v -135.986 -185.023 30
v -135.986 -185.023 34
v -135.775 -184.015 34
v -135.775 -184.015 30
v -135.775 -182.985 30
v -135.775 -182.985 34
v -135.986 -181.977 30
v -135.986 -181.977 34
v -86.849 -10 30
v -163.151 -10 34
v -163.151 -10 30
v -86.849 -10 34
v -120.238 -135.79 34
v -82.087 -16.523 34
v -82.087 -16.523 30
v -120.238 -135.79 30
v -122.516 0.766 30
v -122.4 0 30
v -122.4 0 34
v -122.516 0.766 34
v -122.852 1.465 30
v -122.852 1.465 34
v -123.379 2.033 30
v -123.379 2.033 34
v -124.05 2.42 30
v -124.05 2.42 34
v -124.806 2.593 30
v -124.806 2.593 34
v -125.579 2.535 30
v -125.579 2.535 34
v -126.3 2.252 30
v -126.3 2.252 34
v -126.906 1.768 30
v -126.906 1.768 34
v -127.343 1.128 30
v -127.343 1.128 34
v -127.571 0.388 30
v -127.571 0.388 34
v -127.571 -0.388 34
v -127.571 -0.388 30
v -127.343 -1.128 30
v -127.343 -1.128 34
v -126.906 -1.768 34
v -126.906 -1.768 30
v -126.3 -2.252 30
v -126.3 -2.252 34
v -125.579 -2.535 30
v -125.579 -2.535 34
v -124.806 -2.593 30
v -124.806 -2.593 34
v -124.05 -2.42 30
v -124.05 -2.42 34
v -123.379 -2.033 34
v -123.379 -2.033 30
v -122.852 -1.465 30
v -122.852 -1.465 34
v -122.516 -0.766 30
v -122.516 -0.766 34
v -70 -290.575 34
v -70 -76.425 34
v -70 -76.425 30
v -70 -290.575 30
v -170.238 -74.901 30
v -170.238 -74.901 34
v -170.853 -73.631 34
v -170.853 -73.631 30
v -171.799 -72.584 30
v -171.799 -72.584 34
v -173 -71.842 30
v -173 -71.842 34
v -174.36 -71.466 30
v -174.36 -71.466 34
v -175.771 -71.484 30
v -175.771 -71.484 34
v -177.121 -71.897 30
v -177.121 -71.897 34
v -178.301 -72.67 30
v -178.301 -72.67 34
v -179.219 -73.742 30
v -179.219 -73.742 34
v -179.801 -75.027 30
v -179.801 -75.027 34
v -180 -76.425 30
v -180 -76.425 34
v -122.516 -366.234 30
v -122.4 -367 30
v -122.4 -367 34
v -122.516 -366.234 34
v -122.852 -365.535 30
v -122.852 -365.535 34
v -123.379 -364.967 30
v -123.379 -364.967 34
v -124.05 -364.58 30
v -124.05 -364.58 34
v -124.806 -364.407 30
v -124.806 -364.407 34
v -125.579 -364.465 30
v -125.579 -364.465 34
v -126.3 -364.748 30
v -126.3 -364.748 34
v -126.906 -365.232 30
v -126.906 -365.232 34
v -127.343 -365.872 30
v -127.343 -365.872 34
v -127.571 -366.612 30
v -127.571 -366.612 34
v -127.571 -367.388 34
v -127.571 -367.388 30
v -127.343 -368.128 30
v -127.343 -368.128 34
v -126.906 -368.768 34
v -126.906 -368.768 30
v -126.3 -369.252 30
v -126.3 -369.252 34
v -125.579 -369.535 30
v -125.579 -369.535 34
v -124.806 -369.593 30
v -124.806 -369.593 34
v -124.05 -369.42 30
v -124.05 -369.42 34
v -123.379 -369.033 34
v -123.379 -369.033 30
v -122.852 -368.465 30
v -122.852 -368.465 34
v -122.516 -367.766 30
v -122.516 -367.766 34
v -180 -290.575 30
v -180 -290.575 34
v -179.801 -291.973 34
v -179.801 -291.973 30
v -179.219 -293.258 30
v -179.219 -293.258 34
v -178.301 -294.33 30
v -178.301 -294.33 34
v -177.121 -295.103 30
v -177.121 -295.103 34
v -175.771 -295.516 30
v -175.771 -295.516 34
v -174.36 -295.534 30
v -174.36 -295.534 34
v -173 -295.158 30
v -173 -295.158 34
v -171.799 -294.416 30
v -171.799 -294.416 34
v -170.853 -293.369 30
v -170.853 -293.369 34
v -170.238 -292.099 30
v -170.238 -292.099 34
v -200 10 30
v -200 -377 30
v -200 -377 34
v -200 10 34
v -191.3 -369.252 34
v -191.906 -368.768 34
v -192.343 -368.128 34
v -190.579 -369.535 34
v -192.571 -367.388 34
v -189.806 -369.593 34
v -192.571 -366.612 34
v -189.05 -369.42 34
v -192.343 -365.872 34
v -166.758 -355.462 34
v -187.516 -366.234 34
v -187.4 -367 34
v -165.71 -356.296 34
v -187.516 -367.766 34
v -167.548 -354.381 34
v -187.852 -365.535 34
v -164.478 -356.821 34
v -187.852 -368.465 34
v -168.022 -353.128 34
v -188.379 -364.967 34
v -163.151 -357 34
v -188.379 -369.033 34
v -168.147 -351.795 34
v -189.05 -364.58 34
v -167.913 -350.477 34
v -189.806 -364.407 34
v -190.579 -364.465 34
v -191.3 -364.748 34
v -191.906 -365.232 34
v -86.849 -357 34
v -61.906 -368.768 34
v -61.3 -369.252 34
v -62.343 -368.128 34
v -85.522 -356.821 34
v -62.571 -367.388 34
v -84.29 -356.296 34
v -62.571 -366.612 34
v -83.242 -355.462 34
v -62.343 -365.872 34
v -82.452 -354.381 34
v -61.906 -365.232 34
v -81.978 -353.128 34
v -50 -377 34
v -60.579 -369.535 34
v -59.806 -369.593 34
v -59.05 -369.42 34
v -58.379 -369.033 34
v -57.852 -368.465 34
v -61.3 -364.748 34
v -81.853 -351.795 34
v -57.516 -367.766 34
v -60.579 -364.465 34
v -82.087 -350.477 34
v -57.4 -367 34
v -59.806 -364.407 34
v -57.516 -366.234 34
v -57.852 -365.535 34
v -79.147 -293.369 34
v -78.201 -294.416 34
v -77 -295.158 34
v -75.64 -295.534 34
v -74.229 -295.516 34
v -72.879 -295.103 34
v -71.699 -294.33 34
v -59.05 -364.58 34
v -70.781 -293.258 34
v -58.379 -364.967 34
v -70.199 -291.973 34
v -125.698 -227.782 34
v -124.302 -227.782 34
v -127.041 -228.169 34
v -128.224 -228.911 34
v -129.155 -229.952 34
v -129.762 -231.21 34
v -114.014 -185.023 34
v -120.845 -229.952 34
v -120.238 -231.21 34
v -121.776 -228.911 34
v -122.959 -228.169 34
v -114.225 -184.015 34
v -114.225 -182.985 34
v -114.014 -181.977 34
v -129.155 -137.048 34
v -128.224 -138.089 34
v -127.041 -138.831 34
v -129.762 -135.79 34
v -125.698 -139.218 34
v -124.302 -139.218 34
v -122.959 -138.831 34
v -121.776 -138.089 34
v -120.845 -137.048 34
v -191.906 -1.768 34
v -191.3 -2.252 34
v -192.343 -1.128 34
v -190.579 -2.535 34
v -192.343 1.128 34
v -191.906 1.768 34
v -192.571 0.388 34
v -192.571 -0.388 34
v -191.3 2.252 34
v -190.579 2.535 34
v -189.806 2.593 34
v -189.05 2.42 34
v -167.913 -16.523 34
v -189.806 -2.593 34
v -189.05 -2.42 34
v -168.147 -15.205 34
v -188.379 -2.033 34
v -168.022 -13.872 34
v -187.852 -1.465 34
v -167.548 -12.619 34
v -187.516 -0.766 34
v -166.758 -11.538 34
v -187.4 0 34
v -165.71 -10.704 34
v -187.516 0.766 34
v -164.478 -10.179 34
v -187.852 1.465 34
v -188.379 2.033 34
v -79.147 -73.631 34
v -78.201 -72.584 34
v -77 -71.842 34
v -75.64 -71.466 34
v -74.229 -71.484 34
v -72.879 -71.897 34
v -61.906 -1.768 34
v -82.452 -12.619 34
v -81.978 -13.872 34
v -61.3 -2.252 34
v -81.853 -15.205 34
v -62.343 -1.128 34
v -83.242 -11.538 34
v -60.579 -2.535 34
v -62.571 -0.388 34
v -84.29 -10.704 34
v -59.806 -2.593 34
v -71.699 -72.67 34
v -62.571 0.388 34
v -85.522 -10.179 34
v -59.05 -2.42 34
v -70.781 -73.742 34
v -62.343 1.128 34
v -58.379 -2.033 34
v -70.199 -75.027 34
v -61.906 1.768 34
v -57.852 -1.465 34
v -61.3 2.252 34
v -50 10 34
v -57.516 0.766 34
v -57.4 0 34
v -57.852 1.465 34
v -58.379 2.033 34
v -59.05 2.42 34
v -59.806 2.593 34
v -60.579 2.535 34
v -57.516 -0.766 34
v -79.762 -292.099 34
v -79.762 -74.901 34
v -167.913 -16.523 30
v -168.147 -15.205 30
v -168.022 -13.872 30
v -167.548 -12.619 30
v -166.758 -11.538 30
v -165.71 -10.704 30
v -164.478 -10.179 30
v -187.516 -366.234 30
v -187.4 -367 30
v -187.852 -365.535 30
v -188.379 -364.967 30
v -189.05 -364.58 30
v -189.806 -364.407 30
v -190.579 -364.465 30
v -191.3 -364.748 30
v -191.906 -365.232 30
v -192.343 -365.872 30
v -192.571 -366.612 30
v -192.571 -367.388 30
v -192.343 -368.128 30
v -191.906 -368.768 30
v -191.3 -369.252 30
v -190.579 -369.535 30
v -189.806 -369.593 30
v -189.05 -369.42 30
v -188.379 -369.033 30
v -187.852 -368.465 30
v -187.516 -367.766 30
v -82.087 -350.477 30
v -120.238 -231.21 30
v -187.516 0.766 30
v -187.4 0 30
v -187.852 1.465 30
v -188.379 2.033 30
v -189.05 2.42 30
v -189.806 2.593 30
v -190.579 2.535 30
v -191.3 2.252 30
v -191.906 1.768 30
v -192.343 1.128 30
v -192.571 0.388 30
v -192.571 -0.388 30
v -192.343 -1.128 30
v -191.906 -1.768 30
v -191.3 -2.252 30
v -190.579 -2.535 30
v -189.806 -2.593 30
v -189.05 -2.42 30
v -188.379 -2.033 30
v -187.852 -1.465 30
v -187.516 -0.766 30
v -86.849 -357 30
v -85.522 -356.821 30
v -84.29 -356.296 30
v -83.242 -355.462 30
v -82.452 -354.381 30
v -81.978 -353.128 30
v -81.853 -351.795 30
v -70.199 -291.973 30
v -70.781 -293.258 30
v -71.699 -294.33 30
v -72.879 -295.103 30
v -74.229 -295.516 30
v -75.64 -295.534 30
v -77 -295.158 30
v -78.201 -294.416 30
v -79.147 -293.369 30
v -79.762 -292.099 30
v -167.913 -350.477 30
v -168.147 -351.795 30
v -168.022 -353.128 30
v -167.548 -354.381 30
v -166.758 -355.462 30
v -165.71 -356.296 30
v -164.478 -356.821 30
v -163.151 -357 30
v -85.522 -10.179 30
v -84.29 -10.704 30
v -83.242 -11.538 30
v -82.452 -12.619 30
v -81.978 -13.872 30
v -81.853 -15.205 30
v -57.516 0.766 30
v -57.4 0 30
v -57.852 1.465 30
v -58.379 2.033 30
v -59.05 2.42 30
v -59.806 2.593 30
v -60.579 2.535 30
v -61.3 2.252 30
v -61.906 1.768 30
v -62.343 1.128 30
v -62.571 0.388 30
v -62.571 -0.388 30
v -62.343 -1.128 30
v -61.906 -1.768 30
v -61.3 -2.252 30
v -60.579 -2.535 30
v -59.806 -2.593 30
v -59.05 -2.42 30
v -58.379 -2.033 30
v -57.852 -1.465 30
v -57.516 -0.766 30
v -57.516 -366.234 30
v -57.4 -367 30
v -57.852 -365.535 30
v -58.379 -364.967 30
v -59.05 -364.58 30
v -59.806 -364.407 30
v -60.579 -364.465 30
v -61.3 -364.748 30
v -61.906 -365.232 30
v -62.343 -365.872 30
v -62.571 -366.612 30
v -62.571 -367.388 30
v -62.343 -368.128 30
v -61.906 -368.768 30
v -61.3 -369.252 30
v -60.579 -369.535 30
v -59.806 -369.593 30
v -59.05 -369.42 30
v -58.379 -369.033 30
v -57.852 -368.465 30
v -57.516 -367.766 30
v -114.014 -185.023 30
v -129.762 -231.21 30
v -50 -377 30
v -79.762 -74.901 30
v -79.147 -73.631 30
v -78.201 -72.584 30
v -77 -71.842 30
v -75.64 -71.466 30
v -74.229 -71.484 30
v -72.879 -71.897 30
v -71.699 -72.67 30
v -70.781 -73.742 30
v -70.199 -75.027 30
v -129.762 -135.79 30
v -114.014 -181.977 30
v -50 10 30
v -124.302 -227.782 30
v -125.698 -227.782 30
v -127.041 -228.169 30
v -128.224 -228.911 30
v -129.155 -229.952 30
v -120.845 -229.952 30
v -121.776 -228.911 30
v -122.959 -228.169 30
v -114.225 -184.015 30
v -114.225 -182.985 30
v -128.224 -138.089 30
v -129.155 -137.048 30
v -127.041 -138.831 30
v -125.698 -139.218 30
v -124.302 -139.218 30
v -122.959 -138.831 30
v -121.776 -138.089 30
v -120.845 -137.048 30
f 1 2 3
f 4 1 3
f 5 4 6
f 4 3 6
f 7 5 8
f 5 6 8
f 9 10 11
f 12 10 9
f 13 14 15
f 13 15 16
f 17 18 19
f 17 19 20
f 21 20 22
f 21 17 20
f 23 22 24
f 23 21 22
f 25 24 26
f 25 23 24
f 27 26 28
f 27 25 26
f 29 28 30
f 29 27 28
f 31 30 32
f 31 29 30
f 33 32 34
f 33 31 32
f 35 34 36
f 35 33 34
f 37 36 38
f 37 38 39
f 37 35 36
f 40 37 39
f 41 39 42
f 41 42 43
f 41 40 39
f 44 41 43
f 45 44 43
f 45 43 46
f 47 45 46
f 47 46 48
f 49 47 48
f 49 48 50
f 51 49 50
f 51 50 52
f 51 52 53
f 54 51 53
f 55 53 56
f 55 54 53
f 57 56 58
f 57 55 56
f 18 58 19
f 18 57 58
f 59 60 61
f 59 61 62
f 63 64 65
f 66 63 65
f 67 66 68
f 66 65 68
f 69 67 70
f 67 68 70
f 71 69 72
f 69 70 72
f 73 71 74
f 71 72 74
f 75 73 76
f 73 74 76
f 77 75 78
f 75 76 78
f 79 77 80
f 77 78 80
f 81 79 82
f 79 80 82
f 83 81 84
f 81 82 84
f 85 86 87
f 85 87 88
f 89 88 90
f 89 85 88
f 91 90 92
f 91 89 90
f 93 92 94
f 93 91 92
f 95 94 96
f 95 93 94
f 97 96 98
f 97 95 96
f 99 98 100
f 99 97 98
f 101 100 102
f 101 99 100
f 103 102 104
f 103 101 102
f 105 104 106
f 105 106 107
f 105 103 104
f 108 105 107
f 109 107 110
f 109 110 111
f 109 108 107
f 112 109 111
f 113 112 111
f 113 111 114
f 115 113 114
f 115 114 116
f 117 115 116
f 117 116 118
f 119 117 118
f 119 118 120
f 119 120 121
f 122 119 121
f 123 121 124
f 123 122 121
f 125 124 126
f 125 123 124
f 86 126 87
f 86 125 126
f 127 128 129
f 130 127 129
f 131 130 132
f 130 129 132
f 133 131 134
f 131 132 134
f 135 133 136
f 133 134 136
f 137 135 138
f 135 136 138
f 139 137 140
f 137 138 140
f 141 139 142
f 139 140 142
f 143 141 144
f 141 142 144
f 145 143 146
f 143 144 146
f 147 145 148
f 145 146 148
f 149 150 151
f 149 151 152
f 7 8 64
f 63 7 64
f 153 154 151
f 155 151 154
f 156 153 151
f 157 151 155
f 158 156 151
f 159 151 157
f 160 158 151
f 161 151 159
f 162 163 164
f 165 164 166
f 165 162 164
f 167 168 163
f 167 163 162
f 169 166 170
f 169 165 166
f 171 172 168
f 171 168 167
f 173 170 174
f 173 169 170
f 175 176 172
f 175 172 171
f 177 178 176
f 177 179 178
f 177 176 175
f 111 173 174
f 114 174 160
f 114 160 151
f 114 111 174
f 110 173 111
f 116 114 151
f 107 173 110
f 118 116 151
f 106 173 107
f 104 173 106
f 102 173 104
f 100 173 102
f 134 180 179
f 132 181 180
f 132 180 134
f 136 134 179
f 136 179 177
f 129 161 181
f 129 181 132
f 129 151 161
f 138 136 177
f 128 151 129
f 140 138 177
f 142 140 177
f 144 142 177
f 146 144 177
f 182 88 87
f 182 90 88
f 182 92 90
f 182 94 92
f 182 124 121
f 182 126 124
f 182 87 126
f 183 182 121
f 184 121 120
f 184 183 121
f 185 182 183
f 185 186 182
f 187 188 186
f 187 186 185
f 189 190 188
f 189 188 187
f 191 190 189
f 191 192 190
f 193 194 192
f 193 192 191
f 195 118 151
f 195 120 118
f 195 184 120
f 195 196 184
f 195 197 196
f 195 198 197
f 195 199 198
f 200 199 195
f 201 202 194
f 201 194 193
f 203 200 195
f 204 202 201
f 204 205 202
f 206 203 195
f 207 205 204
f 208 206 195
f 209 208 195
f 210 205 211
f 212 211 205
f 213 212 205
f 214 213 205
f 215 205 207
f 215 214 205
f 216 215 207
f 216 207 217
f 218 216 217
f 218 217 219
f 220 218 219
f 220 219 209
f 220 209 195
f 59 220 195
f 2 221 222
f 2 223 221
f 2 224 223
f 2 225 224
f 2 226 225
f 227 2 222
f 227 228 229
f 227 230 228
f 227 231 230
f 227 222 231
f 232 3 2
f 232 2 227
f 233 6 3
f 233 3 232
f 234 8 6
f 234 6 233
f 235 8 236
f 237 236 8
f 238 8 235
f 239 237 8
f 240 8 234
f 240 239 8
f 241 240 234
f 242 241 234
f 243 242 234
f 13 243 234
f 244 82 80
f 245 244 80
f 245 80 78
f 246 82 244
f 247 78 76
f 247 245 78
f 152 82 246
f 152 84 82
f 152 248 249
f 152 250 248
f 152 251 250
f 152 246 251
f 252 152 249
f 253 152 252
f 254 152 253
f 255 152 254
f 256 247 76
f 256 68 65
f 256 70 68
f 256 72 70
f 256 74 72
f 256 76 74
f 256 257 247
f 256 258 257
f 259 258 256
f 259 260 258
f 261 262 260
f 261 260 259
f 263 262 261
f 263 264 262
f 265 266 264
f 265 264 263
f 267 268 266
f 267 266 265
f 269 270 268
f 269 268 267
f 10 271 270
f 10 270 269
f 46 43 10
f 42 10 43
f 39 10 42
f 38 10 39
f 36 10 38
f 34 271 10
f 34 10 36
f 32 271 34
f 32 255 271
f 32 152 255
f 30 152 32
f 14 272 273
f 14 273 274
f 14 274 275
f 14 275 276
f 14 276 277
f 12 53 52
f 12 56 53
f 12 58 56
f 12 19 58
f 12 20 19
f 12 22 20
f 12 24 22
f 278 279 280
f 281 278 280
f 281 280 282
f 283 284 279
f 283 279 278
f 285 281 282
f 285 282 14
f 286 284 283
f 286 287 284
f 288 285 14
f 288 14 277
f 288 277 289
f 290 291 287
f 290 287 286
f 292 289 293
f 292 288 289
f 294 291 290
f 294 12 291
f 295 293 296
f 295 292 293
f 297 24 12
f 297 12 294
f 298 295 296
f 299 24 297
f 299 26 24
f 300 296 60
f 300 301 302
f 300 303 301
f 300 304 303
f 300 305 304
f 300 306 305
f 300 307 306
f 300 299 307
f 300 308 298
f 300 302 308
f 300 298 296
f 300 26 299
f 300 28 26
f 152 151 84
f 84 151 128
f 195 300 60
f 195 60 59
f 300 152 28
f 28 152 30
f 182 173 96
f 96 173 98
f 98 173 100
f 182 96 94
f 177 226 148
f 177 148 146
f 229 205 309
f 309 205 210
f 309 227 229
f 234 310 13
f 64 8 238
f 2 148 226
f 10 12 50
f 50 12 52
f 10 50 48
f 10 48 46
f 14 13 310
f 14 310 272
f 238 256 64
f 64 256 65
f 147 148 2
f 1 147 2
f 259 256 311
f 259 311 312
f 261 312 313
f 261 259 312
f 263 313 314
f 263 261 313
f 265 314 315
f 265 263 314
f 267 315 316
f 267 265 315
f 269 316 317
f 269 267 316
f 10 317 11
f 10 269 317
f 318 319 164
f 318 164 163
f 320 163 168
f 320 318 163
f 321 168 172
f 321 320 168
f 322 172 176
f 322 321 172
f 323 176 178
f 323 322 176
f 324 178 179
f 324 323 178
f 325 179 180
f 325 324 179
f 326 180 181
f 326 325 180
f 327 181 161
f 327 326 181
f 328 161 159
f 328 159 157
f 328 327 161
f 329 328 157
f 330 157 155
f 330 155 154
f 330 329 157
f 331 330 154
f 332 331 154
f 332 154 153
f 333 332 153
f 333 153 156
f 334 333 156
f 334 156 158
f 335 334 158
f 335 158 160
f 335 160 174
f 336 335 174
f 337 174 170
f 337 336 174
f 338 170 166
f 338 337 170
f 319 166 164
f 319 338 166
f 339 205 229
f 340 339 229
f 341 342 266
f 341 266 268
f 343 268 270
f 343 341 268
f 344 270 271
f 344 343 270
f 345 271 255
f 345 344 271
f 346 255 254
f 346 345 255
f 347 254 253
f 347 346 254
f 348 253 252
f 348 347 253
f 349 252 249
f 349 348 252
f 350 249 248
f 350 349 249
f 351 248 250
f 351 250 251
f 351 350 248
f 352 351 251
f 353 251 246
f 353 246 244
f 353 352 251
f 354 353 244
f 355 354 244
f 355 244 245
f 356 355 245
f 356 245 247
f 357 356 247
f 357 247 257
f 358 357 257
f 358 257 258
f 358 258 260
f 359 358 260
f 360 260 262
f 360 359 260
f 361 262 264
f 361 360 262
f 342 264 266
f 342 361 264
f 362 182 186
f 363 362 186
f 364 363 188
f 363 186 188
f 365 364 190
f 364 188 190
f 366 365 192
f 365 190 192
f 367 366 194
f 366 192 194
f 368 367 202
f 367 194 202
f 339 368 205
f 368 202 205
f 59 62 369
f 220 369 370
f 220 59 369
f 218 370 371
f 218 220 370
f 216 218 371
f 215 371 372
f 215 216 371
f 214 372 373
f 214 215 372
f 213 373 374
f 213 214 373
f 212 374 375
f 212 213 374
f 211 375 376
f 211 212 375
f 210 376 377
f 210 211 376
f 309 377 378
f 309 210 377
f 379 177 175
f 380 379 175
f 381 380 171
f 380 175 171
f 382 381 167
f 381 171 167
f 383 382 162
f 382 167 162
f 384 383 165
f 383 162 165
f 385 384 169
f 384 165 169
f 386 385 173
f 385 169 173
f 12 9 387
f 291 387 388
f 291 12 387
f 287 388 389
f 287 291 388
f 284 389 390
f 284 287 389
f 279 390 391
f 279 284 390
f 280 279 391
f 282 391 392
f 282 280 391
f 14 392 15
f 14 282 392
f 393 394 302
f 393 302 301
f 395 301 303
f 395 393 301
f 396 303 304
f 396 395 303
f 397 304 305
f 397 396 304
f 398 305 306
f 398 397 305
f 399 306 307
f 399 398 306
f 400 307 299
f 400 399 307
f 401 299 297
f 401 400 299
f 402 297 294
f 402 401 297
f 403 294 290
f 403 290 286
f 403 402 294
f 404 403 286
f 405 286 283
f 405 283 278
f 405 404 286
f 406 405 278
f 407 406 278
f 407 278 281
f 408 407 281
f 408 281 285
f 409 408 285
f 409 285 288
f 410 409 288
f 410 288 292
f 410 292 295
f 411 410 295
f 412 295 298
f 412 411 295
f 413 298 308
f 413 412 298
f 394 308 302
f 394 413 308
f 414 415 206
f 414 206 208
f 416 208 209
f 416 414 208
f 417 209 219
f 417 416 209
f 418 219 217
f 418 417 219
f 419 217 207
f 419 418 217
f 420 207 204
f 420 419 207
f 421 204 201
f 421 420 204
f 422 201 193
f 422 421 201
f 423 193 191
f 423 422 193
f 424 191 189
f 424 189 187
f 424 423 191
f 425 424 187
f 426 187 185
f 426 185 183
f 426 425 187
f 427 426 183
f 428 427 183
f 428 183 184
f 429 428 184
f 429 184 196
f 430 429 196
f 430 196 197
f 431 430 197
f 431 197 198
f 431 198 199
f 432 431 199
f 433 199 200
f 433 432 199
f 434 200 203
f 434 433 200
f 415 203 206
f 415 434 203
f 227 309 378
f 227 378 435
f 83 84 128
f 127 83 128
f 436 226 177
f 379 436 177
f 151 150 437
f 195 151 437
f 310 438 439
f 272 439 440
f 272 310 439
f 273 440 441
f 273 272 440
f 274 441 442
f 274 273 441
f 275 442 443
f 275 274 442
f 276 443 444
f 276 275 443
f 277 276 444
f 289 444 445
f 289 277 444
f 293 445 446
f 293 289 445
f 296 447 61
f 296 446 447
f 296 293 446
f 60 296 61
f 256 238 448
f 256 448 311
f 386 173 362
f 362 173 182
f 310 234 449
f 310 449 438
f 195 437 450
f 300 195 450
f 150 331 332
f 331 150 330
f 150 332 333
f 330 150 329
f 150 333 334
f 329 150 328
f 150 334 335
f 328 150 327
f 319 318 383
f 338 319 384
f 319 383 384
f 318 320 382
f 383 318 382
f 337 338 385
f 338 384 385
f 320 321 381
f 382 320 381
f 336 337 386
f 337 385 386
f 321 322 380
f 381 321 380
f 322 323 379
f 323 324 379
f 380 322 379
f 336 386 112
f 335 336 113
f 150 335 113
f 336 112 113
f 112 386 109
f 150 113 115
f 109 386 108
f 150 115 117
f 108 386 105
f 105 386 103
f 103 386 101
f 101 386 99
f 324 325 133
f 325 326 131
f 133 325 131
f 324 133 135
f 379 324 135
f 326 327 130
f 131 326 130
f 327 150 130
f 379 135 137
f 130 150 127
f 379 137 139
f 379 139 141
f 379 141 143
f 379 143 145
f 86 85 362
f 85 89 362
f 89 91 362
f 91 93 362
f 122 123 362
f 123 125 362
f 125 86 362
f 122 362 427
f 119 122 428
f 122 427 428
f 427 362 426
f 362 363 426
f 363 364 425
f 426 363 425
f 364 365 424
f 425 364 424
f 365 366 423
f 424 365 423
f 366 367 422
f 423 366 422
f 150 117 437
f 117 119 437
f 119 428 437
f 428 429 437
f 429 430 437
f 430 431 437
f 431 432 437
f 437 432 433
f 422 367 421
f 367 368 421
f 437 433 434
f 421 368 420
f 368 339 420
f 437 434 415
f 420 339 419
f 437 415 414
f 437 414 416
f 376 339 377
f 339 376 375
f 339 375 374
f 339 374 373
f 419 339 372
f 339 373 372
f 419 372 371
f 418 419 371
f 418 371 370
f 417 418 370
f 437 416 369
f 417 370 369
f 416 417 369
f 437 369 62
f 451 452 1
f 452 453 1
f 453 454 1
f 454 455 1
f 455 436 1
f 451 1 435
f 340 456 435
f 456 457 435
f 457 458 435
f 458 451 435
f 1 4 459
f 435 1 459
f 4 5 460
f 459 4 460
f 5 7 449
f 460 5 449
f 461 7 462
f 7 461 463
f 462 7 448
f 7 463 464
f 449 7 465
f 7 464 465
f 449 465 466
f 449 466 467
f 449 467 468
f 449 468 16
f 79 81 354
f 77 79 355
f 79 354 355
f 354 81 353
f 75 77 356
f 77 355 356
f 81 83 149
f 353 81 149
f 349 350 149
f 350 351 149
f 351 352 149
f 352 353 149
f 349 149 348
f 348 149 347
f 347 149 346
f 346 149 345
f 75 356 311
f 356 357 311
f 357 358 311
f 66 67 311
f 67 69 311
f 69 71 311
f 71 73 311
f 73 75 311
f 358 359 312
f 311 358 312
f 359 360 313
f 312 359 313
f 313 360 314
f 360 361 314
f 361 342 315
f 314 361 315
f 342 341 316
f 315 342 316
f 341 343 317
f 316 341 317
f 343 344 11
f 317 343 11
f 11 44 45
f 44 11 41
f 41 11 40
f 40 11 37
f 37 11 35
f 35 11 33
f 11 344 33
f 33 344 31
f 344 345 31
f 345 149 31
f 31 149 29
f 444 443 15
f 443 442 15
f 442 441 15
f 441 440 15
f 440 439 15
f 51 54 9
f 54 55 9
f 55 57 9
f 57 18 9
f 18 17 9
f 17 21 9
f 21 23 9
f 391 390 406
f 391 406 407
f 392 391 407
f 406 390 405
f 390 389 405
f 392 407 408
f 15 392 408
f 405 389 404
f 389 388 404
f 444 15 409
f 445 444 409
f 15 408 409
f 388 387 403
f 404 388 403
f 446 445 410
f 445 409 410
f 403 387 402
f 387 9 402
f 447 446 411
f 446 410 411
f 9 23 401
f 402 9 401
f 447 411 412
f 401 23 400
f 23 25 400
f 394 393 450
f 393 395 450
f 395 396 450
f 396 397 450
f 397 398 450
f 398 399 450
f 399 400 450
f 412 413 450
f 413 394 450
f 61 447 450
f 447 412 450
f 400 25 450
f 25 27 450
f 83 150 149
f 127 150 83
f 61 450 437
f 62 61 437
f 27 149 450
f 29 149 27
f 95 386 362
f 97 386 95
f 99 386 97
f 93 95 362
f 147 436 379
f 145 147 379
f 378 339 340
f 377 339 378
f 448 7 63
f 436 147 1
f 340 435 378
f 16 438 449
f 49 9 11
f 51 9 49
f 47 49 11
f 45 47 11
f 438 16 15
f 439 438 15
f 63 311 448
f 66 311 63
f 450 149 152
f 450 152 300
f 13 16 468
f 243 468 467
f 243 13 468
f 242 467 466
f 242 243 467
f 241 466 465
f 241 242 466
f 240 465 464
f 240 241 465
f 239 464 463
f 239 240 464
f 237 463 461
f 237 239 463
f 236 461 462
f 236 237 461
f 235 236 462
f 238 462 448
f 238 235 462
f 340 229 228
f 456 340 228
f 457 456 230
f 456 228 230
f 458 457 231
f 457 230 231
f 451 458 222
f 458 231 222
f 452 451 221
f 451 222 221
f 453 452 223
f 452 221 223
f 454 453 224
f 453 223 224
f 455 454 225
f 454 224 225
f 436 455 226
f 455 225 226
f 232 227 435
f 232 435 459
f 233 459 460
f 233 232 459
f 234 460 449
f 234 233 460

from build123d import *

# Parameters (mm, degrees)
SKETCH2_W           = 150
SKETCH2_H           = 387
SKETCH2_R           = 2.6
BOSS_EXTRUDE1_DEPTH = 4
CUT_EXTRUDE1_DEPTH  = 10


with BuildPart() as part:
    # Sketch2 → Boss-Extrude1 (new body)
    with BuildSketch(Plane.XY.offset(30)):
        with Locations((-125, -183.5)):
            Rectangle(SKETCH2_W, SKETCH2_H)
        with Locations((-190, 0)):
            Circle(SKETCH2_R, mode=Mode.SUBTRACT)
        with Locations((-60, 0)):
            Circle(SKETCH2_R, mode=Mode.SUBTRACT)
        with Locations((-125, 0)):
            Circle(SKETCH2_R, mode=Mode.SUBTRACT)
        with Locations((-60, -367)):
            Circle(SKETCH2_R, mode=Mode.SUBTRACT)
        with Locations((-125, -367)):
            Circle(SKETCH2_R, mode=Mode.SUBTRACT)
        with Locations((-190, -367)):
            Circle(SKETCH2_R, mode=Mode.SUBTRACT)
    extrude(amount=BOSS_EXTRUDE1_DEPTH)

    # Sketch3 → Cut-Extrude1 (cut)
    with BuildSketch(Plane.XY.offset(34)):
        with BuildLine():
            Line((-163.151021772, -10), (-86.848978228, -10))
            ThreePointArc((-86.848978228, -10), (-82.810612321, -12.051847901), (-82.086691458, -16.523359681))
            Line((-82.086691458, -16.523359681), (-120.23771323, -135.790075557))
            ThreePointArc((-120.23771323, -135.790075557), (-125, -139.266715876), (-129.76228677, -135.790075557))
            Line((-129.76228677, -135.790075557), (-167.913308542, -16.523359681))
            ThreePointArc((-167.913308542, -16.523359681), (-167.189387679, -12.051847901), (-163.151021772, -10))
        make_face()
        with BuildLine():
            Line((-180, -76.424605697), (-180, -290.575394303))
            ThreePointArc((-180, -290.575394303), (-175.770897577, -295.515608562), (-170.23771323, -292.098753984))
            Line((-170.23771323, -292.098753984), (-135.986449838, -185.023359681))
            ThreePointArc((-135.986449838, -185.023359681), (-135.748736609, -183.5), (-135.986449838, -181.976640319))
            Line((-135.986449838, -181.976640319), (-170.23771323, -74.901246016))
            ThreePointArc((-170.23771323, -74.901246016), (-175.770897577, -71.484391438), (-180, -76.424605697))
        make_face()
        with BuildLine():
            Line((-163.151021772, -357), (-86.848978228, -357))
            ThreePointArc((-86.848978228, -357), (-82.810612321, -354.948152099), (-82.086691458, -350.476640319))
            Line((-82.086691458, -350.476640319), (-120.23771323, -231.209924443))
            ThreePointArc((-120.23771323, -231.209924443), (-125, -227.733284124), (-129.76228677, -231.209924443))
            Line((-129.76228677, -231.209924443), (-167.913308542, -350.476640319))
            ThreePointArc((-167.913308542, -350.476640319), (-167.189387679, -354.948152099), (-163.151021772, -357))
        make_face()
        with BuildLine():
            Line((-70, -76.424605697), (-70, -290.575394303))
            ThreePointArc((-70, -290.575394303), (-74.229102423, -295.515608562), (-79.76228677, -292.098753984))
            Line((-79.76228677, -292.098753984), (-114.013550162, -185.023359681))
            ThreePointArc((-114.013550162, -185.023359681), (-114.251263391, -183.5), (-114.013550162, -181.976640319))
            Line((-114.013550162, -181.976640319), (-79.76228677, -74.901246016))
            ThreePointArc((-79.76228677, -74.901246016), (-74.229102423, -71.484391438), (-70, -76.424605697))
        make_face()
    extrude(amount=-CUT_EXTRUDE1_DEPTH, mode=Mode.SUBTRACT)


solid = part.part
